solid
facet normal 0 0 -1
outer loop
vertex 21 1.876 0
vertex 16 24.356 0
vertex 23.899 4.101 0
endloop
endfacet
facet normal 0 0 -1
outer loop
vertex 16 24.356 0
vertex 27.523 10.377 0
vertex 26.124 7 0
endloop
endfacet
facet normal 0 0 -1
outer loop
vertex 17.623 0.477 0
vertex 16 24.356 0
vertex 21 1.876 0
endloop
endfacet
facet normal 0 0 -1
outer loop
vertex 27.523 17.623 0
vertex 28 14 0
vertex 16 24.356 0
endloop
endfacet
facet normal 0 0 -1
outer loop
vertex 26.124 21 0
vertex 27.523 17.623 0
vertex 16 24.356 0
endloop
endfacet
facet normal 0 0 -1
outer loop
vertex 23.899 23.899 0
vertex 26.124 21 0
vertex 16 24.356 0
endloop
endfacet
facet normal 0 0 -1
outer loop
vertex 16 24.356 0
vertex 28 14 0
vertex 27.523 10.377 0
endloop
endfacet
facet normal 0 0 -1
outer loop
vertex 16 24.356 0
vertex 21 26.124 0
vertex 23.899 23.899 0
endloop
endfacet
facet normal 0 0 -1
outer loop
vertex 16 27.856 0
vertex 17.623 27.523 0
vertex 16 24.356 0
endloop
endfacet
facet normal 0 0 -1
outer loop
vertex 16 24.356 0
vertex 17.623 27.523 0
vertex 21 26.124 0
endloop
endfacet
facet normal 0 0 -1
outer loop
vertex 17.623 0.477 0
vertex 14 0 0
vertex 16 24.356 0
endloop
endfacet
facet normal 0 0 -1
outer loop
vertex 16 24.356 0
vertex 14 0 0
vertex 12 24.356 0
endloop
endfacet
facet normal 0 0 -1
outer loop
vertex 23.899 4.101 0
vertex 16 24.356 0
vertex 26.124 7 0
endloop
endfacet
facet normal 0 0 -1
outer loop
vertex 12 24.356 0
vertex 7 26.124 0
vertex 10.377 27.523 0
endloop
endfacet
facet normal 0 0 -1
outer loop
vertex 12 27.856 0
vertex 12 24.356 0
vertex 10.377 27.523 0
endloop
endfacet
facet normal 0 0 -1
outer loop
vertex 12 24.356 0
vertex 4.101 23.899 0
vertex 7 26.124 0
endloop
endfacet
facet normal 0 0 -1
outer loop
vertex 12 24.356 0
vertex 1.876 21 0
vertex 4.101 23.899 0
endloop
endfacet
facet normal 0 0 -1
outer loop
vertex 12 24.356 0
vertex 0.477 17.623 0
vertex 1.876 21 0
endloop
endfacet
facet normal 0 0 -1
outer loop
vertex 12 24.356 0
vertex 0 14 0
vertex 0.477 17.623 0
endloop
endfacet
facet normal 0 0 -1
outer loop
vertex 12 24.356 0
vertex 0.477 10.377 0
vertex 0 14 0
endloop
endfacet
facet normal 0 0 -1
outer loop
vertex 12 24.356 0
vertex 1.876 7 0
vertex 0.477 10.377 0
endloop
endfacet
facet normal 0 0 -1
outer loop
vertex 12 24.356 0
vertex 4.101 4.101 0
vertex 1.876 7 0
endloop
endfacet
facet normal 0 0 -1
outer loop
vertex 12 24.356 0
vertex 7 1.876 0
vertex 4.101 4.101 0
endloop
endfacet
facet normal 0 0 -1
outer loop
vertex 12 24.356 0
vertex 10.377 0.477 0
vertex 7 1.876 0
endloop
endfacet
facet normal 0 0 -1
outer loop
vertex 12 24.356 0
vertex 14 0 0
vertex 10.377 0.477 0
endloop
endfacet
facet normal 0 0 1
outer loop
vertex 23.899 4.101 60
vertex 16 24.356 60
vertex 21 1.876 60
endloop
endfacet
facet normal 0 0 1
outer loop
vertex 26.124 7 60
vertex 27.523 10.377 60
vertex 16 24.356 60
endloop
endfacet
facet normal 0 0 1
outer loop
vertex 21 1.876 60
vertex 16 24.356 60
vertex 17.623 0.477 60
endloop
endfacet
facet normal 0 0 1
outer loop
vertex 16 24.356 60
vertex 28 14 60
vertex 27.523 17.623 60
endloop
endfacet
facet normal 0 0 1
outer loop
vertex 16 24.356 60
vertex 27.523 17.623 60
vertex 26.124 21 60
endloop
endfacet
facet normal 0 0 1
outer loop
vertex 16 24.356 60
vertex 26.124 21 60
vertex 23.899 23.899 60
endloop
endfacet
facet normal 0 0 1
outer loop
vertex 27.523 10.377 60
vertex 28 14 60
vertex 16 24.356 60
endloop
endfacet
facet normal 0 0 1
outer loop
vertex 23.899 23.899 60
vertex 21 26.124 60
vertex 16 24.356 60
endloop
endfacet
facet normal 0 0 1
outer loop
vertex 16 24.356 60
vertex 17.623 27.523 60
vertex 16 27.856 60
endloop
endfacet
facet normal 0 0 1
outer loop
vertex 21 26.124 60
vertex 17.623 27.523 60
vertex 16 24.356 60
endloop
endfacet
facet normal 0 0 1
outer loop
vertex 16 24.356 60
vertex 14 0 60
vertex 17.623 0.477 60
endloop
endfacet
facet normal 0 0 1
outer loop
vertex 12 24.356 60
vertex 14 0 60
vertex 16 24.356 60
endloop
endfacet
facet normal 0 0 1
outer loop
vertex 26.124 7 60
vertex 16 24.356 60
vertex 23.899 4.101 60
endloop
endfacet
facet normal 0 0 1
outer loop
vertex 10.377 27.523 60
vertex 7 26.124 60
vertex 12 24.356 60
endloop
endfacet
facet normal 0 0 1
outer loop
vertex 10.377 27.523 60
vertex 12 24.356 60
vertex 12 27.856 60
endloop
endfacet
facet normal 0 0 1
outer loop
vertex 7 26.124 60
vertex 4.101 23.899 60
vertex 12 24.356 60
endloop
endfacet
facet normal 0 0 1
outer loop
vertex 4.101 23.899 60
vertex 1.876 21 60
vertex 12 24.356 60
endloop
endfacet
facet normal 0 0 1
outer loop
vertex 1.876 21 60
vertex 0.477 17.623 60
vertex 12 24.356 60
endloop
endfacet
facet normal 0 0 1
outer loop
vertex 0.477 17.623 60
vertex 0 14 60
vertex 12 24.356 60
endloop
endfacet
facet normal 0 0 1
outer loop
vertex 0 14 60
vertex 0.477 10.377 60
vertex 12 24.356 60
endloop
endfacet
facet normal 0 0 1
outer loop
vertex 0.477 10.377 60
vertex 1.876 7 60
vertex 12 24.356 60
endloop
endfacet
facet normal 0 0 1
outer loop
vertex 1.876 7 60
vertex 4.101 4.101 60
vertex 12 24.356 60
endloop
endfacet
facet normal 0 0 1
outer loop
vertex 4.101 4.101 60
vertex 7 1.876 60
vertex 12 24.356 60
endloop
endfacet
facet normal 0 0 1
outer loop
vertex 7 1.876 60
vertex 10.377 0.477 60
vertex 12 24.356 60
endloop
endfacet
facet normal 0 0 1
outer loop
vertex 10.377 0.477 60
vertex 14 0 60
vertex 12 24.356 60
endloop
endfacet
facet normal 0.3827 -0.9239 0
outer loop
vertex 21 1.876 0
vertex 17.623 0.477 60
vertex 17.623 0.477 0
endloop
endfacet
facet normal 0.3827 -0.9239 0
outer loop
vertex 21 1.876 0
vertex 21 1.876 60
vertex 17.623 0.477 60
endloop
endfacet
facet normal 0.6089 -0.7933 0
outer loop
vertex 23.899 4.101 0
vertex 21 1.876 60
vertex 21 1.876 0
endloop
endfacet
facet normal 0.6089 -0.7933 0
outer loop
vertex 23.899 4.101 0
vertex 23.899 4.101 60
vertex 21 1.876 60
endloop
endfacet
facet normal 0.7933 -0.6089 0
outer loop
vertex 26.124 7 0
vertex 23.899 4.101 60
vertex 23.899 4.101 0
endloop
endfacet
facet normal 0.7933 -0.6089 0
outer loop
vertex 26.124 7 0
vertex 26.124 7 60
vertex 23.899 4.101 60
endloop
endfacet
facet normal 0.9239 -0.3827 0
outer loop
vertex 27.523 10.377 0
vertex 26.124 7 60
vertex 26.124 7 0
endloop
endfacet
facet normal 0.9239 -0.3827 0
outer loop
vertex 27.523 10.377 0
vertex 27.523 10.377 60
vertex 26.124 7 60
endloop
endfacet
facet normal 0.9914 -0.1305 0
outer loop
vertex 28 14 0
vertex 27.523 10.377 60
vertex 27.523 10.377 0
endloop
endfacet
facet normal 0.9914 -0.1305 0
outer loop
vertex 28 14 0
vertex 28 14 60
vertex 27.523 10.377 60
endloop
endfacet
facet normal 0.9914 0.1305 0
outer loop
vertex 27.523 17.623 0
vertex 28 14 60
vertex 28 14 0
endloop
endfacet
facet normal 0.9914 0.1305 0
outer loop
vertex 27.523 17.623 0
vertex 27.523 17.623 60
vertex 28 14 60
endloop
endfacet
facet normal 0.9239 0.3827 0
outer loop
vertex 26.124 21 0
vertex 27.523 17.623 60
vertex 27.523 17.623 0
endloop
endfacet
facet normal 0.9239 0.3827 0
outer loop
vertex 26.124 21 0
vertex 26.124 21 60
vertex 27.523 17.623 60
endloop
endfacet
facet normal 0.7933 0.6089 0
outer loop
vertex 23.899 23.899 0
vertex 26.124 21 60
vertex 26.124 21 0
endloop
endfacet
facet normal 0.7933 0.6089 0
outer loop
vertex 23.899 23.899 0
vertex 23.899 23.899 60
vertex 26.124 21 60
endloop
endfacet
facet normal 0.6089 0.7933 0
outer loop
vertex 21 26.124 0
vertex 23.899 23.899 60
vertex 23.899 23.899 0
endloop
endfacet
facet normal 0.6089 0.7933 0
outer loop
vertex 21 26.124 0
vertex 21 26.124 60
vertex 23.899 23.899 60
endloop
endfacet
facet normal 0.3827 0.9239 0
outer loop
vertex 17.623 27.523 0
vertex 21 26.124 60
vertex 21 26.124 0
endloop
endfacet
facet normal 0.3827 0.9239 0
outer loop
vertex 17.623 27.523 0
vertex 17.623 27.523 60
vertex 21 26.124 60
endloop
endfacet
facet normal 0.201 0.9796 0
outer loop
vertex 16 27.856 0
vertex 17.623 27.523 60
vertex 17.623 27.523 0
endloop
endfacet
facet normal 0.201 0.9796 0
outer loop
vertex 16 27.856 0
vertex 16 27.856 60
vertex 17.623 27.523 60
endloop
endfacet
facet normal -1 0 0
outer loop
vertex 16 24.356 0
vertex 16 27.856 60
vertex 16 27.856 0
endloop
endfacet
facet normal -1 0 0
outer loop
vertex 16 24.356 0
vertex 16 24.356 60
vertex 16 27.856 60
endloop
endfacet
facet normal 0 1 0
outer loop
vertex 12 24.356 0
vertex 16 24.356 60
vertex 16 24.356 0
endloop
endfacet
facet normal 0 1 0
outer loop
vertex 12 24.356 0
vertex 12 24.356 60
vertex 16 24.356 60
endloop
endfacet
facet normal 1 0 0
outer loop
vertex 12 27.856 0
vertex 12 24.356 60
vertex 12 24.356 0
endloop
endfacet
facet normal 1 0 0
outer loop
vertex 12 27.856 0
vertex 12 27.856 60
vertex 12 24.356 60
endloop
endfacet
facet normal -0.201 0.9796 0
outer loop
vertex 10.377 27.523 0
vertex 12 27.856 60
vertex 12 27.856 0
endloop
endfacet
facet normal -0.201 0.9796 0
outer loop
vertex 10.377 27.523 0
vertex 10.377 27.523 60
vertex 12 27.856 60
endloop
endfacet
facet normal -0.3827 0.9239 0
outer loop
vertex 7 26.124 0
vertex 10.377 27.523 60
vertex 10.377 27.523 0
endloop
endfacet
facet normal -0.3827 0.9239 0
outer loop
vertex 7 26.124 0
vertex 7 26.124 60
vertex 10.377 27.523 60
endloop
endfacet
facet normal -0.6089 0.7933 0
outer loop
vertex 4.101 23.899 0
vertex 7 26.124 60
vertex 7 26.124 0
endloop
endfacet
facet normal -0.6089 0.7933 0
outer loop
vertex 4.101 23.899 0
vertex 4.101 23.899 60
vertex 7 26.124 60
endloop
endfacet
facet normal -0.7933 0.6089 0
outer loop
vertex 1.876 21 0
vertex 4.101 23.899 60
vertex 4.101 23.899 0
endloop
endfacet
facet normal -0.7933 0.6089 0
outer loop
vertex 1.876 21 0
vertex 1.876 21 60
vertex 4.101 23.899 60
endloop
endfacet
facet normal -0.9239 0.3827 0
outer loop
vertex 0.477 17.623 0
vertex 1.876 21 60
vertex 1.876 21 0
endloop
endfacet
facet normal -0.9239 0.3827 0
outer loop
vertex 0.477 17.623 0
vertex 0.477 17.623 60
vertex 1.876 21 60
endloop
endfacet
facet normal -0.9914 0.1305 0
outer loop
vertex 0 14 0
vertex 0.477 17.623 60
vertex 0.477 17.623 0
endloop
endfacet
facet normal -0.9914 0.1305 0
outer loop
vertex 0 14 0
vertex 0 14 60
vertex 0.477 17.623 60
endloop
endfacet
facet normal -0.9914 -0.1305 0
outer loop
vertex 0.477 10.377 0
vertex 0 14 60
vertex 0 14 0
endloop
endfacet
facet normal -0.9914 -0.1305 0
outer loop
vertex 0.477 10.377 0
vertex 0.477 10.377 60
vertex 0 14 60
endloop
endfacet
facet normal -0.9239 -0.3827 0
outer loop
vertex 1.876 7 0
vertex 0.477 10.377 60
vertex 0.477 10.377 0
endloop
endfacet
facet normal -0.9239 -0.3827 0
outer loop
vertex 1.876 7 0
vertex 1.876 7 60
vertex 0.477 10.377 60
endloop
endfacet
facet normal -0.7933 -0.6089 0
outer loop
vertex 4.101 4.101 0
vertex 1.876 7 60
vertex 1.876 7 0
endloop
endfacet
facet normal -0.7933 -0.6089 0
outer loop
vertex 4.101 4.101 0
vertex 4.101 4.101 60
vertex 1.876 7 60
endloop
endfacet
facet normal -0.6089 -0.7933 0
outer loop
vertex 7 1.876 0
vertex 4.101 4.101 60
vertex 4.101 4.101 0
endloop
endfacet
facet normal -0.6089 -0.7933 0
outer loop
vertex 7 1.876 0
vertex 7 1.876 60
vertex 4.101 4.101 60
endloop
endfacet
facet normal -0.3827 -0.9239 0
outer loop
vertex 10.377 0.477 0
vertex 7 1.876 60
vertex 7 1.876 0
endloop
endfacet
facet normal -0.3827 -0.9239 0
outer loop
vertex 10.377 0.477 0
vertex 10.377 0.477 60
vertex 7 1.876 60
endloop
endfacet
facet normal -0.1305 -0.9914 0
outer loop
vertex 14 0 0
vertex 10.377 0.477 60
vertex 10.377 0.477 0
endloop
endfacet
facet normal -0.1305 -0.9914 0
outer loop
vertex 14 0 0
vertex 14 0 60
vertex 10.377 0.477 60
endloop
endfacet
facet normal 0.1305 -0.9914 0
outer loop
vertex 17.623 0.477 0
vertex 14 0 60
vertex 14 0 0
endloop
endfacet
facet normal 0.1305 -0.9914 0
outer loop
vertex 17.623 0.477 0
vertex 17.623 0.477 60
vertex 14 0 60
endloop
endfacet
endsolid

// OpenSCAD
$fn = 32;

// ----------------------------------------------------------------------
// Keyway shaft: d28 shaft, key 4 x 3.5 mm
// ----------------------------------------------------------------------

// --- parameters (mm) ---
shaft_r = 14;             // shaft radius
key_w = 4;                // keyway width
key_d = 3.5;              // keyway depth below the surface line
plate_t = 60;             // shaft length, Z (extrusion height)

shaft_d = 2 * shaft_r;  // shaft diameter
circle_step = 15;  // polygon sampling step, degrees

profile = [[10.377, 27.523], [7, 26.124], [4.101, 23.899], [1.876, 21], [0.477, 17.623], [0, 14], [0.477, 10.377], [1.876, 7], [4.101, 4.101], [7, 1.876], [10.377, 0.477], [14, 0], [17.623, 0.477], [21, 1.876], [23.899, 4.101], [26.124, 7], [27.523, 10.377], [28, 14], [27.523, 17.623], [26.124, 21], [23.899, 23.899], [21, 26.124], [17.623, 27.523], [16, 27.856], [16, 24.356], [12, 24.356], [12, 27.856]];  // primary outline, 27 points, counter clockwise

// --- the one profile operation ---
linear_extrude(height = plate_t) polygon(points = profile);
